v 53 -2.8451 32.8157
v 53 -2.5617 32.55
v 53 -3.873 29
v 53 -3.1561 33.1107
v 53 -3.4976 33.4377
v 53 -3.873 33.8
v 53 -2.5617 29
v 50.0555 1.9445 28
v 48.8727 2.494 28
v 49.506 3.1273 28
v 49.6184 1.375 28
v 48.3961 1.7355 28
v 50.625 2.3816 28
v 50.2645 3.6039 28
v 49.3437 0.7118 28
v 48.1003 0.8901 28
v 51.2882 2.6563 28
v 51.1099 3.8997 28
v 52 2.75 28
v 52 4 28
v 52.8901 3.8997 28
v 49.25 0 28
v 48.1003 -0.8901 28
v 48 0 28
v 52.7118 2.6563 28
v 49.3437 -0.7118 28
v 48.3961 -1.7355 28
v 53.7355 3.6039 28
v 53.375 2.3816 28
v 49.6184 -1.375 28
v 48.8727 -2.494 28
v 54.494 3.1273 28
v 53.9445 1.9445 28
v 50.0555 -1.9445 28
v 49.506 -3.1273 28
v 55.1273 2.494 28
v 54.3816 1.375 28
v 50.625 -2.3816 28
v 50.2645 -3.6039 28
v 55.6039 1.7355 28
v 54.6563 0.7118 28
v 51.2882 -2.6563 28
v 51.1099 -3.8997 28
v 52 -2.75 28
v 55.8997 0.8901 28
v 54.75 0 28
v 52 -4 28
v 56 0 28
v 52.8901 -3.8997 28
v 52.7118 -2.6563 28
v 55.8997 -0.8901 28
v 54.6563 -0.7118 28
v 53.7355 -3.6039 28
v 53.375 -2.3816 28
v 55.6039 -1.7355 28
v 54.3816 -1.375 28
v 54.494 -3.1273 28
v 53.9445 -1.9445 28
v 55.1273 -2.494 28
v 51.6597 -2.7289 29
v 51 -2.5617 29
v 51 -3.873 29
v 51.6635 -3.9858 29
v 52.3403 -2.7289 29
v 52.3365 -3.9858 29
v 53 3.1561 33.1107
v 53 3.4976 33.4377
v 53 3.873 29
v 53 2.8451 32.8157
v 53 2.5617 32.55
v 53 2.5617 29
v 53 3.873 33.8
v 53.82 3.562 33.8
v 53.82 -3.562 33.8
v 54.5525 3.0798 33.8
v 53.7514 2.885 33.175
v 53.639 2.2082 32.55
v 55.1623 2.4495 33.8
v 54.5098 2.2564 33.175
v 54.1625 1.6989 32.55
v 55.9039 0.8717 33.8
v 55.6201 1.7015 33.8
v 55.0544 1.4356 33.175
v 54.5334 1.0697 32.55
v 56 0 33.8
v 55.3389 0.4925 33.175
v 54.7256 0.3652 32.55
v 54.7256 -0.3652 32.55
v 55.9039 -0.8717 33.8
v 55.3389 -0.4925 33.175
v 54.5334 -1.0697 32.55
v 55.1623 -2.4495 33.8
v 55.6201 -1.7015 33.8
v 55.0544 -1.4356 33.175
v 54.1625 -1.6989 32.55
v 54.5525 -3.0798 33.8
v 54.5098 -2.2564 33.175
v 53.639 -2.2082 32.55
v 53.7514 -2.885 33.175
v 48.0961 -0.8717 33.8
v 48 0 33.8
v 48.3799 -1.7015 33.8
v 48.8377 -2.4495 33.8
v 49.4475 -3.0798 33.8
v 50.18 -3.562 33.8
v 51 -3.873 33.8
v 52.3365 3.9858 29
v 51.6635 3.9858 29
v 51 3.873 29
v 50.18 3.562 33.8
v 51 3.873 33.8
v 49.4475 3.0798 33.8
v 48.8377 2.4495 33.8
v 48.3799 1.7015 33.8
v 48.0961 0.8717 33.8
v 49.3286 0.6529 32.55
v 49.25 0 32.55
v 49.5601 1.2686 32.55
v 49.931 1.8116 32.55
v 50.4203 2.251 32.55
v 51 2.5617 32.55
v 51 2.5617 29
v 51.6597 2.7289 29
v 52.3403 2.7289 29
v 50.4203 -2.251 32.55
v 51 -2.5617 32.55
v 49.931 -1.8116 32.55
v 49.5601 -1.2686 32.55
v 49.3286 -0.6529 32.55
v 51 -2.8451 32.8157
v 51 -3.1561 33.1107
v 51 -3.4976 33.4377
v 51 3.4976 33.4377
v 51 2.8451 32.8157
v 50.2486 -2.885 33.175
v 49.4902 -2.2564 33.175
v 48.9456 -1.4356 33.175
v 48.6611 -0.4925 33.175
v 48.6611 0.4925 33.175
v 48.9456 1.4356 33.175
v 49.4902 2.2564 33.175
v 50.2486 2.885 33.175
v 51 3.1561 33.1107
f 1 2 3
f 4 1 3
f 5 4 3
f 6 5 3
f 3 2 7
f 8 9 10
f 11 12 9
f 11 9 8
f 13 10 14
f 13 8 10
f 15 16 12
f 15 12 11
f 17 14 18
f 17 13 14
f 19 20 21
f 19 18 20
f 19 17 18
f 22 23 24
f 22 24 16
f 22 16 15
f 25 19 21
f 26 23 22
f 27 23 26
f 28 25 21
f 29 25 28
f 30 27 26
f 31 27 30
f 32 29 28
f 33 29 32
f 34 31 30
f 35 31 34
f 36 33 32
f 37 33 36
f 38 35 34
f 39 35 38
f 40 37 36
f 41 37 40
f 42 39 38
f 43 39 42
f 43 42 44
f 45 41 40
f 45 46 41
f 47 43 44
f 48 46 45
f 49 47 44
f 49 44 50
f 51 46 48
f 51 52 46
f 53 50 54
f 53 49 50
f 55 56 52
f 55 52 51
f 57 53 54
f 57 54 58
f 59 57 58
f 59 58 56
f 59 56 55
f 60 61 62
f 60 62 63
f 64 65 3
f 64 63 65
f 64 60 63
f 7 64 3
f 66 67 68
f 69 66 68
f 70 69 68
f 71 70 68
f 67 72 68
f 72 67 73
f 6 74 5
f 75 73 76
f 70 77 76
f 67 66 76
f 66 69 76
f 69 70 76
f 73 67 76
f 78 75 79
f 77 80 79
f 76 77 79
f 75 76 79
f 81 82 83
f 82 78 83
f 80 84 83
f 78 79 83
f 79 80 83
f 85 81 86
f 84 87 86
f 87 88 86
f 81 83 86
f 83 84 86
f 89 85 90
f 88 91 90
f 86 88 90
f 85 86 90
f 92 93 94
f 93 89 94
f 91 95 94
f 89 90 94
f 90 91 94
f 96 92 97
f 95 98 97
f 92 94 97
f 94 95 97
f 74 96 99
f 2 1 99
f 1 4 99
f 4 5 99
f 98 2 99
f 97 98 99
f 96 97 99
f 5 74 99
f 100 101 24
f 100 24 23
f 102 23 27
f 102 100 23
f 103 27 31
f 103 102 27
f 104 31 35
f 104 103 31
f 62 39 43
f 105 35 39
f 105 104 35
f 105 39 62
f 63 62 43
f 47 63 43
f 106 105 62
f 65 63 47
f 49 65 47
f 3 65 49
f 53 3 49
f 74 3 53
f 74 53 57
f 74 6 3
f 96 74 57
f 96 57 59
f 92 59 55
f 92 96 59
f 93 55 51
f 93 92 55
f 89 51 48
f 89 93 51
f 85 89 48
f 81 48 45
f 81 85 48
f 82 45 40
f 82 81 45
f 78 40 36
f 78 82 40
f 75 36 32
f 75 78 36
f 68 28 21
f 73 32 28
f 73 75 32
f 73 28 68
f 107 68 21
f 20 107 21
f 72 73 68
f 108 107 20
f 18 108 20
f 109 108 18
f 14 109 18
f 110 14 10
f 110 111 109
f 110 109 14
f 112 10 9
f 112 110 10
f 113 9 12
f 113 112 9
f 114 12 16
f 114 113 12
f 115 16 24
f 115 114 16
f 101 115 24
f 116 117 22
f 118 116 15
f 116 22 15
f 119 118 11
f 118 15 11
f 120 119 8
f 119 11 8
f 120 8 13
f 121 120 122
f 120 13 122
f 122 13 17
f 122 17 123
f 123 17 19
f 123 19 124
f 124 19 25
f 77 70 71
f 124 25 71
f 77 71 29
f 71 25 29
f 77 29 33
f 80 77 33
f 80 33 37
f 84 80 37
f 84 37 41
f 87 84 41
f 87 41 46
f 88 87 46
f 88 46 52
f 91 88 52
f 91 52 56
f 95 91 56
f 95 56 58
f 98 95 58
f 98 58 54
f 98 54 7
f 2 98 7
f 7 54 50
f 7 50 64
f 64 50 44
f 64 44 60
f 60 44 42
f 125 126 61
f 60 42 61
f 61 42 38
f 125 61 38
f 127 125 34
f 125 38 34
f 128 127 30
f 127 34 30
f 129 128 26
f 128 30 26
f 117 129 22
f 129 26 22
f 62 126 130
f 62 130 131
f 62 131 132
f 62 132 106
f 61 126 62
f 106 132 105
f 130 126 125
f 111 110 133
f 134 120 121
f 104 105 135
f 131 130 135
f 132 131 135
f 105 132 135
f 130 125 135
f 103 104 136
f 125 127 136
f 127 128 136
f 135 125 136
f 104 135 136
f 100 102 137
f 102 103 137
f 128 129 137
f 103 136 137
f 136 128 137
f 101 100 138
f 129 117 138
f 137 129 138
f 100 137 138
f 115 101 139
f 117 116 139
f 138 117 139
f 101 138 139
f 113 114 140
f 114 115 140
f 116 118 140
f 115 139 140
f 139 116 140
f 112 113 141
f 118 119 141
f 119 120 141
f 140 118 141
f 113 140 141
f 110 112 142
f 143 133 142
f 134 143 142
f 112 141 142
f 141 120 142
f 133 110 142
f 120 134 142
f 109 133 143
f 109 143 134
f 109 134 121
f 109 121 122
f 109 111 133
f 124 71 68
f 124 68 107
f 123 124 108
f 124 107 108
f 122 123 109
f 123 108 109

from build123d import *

# Parameters (mm, degrees)
FORMSENKUNG_F_R_M5_LINSENSENKSCHRAUBE_MI_D           = 5.5
FORMSENKUNG_F_R_M5_LINSENSENKSCHRAUBE_MI_CSINK_D     = 10.4
FORMSENKUNG_F_R_M5_LINSENSENKSCHRAUBE_MI_CSINK_ANGLE = 90
SKIZZE7_W                                            = 1
SKIZZE7_H                                            = 6
SCHNITT_LINEAR_AUSTRAGEN1_DEPTH                      = 66.531976927


with BuildPart() as part:
    # Skizze2 → Rotation1 (revolve)
    with BuildSketch(Plane(origin=(0, 0, 0), x_dir=(1, 0, 0), z_dir=(0, 1, 0))):
        Polygon((48, -35), (52, -35), (52, -29), (52, -28), (48, -28), (48, -29), align=None)
    revolve(axis=Axis((52, 0, 29), (0, 0, 1)))

    # Formsenkung für M5 Linsensenkschraube mit Schlitz1 (through all)
    with Locations(Plane.XY.offset(35)):
        with Locations((52, 0)):
            CounterSinkHole(FORMSENKUNG_F_R_M5_LINSENSENKSCHRAUBE_MI_D / 2, FORMSENKUNG_F_R_M5_LINSENSENKSCHRAUBE_MI_CSINK_D / 2, counter_sink_angle=FORMSENKUNG_F_R_M5_LINSENSENKSCHRAUBE_MI_CSINK_ANGLE)

    # Skizze7 → Schnitt-Linear austragen1 (cut, symmetric)
    with BuildSketch(Plane(origin=(0, 0, 0), x_dir=(1, 0, 0), z_dir=(0, 1, 0))):
        with Locations((51.5, -32)):
            Rectangle(SKIZZE7_W, SKIZZE7_H)
    schnitt_linear_austragen1 = extrude(amount=SCHNITT_LINEAR_AUSTRAGEN1_DEPTH, both=True, mode=Mode.SUBTRACT)

    # Spiegeln1: Schnitt-Linear austragen1 across plane
    add(schnitt_linear_austragen1.mirror(Plane(origin=(52, -4, 29), x_dir=(0, 0, 1), z_dir=(1, 0, 0))), mode=Mode.SUBTRACT)


solid = part.part
